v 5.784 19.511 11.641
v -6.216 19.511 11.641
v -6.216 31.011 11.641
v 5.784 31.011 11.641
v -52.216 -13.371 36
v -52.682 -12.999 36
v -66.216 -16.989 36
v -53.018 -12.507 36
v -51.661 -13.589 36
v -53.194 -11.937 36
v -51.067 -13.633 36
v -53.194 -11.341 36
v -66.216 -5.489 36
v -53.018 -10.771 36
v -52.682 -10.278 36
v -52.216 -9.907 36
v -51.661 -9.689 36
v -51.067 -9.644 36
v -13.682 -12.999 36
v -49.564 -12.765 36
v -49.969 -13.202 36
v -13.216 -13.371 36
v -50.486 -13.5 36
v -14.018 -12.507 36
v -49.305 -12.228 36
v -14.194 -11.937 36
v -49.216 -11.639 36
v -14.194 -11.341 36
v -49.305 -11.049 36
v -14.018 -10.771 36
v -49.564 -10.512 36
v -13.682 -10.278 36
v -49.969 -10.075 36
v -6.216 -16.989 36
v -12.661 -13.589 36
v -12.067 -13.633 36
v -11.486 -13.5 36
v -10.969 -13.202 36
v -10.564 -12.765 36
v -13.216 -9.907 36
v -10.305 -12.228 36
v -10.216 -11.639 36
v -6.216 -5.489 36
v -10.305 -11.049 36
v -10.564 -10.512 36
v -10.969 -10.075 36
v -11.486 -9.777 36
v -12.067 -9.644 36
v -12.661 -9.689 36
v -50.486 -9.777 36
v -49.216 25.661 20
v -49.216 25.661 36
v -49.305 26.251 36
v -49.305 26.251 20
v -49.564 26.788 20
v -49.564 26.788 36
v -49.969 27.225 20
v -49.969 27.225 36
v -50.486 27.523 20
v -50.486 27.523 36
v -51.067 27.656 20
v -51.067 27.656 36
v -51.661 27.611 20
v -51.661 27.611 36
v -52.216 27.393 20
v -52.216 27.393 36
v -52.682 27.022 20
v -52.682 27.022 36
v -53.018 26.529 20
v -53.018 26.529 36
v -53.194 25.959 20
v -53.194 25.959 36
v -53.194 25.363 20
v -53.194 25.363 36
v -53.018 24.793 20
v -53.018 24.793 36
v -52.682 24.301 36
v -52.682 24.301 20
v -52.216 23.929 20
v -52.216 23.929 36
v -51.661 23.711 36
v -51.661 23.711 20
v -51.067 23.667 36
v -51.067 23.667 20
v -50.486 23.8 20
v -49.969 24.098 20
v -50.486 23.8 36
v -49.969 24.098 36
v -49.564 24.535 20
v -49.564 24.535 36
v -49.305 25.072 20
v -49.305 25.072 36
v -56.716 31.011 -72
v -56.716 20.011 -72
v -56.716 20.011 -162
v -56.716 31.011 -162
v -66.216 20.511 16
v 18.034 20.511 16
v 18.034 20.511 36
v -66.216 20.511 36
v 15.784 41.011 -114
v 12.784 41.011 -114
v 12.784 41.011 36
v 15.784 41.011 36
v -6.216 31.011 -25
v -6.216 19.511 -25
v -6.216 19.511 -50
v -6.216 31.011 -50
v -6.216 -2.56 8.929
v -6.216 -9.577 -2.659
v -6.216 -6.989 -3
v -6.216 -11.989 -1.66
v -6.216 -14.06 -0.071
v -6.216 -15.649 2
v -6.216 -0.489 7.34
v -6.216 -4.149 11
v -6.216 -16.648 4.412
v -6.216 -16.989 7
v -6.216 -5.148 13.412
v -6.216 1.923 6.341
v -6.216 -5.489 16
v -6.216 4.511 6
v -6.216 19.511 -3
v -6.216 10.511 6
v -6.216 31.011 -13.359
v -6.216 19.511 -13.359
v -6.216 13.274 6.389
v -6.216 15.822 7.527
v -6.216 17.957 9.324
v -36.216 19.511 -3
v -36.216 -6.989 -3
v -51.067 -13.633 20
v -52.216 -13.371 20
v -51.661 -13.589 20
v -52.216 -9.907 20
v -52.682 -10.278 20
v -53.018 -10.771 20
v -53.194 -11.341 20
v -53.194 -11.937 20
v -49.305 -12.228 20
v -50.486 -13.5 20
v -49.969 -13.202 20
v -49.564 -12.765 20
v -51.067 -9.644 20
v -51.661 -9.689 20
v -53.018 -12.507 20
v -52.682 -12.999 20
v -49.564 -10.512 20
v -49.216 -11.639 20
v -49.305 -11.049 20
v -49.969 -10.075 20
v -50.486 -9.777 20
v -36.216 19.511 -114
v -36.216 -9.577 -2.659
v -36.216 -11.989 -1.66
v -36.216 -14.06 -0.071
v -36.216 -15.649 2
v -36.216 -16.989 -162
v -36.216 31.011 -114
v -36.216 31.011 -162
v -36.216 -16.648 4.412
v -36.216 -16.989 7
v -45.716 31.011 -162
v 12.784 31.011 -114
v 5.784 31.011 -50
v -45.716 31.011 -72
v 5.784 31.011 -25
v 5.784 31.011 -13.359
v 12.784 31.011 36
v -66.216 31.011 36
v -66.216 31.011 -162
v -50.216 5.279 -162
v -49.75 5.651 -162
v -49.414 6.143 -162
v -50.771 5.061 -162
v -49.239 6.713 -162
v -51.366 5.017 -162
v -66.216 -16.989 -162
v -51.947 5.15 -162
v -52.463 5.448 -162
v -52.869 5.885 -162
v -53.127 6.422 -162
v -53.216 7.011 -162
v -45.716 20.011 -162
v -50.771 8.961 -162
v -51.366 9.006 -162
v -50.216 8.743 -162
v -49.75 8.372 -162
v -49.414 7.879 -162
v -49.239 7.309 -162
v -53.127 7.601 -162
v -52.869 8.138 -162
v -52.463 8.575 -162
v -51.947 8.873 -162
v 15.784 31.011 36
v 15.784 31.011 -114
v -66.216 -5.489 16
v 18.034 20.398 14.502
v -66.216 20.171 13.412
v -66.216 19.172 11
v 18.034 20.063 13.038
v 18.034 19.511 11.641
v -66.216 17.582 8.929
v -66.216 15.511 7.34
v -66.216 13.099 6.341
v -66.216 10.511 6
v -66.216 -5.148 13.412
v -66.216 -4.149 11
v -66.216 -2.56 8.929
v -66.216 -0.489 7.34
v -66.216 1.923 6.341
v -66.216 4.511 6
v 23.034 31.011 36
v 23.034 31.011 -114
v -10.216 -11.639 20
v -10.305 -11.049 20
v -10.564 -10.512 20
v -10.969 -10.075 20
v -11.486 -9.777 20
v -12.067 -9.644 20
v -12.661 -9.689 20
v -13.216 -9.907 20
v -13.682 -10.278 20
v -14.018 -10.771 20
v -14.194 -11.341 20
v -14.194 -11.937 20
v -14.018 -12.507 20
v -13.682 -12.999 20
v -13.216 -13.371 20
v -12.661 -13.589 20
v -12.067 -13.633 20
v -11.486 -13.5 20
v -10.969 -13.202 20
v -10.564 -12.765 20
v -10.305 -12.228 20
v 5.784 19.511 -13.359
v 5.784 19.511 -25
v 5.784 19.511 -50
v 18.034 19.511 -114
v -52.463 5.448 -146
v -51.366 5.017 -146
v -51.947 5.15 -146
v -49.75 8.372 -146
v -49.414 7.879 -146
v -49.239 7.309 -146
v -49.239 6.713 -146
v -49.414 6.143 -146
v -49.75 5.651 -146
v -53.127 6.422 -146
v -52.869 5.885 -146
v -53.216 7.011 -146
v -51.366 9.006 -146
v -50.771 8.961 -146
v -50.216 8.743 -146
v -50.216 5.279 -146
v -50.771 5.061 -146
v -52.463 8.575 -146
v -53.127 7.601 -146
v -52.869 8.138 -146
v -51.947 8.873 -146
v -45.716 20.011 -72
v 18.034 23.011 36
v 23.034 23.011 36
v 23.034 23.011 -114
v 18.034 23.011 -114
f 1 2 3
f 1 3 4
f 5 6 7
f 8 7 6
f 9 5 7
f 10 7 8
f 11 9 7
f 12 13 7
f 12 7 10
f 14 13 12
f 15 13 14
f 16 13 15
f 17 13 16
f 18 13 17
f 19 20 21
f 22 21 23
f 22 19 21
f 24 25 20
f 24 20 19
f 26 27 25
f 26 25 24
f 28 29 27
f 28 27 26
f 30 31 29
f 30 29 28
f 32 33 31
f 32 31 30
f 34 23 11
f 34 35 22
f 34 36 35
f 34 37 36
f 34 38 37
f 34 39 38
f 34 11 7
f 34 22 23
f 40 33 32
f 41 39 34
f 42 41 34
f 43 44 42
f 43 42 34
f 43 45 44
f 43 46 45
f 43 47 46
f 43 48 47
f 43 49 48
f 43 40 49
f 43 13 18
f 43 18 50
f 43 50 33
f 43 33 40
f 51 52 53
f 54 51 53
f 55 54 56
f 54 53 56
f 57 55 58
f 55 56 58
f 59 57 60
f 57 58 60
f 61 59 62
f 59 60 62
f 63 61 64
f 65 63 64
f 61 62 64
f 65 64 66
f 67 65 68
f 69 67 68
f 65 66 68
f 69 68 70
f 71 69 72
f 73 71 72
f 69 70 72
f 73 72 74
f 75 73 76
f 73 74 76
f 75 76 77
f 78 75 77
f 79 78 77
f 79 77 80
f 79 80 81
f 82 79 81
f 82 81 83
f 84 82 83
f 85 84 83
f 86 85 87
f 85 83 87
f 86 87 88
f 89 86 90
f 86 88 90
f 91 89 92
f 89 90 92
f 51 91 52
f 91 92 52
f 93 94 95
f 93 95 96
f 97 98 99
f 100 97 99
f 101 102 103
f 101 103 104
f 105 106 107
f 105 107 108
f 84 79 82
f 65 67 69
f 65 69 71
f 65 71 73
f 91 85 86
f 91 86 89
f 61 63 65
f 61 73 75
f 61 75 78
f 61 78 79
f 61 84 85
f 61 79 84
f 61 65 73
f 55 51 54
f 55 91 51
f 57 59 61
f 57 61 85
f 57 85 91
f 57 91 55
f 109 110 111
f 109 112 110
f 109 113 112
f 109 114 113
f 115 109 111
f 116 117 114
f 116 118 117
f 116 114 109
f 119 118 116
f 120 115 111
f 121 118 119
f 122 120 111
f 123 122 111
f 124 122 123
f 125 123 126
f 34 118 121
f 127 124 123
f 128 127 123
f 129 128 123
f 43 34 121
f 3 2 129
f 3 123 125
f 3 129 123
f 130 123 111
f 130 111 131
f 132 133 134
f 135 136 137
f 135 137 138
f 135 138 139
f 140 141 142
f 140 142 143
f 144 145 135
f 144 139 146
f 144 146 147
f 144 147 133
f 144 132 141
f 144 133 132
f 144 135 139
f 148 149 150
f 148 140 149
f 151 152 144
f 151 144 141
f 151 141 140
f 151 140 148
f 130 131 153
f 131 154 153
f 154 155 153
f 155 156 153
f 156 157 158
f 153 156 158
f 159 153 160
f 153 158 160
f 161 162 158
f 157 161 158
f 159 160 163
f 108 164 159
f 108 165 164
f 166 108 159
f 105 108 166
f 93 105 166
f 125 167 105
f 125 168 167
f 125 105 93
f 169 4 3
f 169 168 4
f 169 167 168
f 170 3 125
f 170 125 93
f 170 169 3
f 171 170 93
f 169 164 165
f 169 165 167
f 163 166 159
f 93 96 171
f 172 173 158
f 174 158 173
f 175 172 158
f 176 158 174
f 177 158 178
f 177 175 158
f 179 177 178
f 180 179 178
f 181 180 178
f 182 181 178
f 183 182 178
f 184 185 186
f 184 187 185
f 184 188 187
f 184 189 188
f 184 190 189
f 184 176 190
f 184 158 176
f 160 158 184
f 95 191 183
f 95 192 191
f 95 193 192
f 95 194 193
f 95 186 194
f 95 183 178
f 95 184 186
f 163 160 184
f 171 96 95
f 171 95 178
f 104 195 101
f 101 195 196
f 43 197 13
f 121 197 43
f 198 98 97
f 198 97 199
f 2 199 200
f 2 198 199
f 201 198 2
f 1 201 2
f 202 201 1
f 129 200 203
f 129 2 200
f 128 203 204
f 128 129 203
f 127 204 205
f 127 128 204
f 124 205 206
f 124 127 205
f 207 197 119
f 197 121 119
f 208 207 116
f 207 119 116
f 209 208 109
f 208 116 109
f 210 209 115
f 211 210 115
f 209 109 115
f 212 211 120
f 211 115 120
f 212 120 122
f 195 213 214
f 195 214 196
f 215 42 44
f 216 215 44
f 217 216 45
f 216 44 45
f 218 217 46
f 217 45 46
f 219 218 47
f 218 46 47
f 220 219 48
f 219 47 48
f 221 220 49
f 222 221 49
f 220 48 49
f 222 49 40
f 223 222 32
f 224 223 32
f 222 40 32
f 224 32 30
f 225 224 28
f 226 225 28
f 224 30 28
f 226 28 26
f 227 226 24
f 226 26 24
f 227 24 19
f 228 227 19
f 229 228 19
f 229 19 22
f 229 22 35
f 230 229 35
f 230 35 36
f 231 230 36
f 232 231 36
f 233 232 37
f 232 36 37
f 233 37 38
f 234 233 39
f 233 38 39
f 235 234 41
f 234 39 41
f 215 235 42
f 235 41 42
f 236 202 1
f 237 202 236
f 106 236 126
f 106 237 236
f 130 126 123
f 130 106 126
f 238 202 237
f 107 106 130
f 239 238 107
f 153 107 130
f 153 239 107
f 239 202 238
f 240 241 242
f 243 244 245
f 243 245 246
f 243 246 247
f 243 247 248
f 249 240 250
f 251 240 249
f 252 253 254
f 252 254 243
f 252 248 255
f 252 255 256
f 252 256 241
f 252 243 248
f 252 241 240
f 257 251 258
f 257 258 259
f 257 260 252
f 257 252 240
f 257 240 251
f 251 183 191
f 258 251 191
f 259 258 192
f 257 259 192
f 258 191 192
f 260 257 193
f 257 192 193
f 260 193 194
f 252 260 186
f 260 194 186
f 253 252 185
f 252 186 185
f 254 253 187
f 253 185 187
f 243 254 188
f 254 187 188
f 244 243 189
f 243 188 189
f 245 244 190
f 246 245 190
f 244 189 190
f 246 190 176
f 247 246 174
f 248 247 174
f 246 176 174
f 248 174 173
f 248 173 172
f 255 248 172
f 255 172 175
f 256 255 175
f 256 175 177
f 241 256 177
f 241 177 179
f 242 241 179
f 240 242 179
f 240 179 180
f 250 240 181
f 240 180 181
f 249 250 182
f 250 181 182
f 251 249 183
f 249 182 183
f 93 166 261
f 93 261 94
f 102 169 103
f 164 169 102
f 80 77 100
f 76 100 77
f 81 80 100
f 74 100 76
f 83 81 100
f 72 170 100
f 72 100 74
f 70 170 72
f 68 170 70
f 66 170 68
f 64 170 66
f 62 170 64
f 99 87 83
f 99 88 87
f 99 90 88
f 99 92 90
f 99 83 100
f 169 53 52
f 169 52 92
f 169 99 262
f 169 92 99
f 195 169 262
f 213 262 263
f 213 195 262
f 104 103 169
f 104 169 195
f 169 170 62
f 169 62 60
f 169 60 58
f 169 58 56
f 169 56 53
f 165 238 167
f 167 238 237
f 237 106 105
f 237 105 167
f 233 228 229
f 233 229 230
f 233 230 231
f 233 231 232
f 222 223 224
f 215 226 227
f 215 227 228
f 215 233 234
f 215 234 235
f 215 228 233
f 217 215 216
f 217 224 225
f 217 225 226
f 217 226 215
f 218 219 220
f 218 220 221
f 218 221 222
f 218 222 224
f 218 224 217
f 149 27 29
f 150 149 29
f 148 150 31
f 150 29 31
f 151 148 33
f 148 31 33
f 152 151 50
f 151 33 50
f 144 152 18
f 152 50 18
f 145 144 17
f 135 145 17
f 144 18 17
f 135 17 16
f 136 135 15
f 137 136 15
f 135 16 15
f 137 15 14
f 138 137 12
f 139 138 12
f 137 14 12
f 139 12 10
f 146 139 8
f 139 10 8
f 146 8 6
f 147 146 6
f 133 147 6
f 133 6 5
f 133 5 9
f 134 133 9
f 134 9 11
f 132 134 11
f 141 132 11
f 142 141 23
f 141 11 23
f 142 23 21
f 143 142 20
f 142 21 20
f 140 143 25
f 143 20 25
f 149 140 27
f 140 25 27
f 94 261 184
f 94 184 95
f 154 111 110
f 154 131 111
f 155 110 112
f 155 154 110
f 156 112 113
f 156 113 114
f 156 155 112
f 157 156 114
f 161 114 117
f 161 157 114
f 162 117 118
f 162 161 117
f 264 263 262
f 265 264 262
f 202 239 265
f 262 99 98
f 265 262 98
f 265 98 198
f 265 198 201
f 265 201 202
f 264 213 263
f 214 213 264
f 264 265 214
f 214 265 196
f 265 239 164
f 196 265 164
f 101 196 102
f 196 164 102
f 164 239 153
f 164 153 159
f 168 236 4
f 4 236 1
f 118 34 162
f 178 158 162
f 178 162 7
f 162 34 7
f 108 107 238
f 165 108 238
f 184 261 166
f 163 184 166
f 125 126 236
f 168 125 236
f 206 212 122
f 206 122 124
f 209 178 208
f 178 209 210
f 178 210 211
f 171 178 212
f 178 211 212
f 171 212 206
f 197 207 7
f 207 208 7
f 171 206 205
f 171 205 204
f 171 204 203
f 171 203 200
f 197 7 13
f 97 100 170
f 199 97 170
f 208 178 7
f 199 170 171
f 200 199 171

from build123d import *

# Parameters (mm, degrees)
CROQUIS1_W                 = 60
CROQUIS1_H                 = 48
SALIENTE_EXTRUIR1_DEPTH    = 6
CROQUIS4_W                 = 60
CROQUIS4_H                 = 11.5
SALIENTE_EXTRUIR3_DEPTH    = 30
CROQUIS5_R                 = 2
CORTAR_EXTRUIR3_DEPTH      = 16
CROQUIS6_W                 = 30
CROQUIS6_H                 = 48
SALIENTE_EXTRUIR4_DEPTH    = 162
CROQUIS7_R                 = 2
CORTAR_EXTRUIR4_DEPTH      = 16
CROQUIS11_W                = 150
CROQUIS11_H                = 11.5
SALIENTE_EXTRUIR6_DEPTH    = 59.25
CROQUIS12_W                = 3
CROQUIS12_H                = 150
SALIENTE_EXTRUIR7_DEPTH    = 10
CORTAR_EXTRUIR6_DEPTH      = 170.016303475
CORTAR_EXTRUIR6_DEPTH_BACK = 170.016303475
CROQUIS14_W                = 5
CROQUIS14_H                = 3.5
CORTAR_EXTRUIR7_DEPTH      = 213.768679181
CORTAR_EXTRUIR7_DEPTH_BACK = 90
CROQUIS15_W                = 11
CROQUIS15_H                = 11
CROQUIS16_W                = 30
CROQUIS16_H                = 1
CORTAR_EXTRUIR10_DEPTH     = 190.450484429
REDONDEO1_R                = 10
CROQUIS20_W                = 30
CROQUIS20_H                = 36.5
SALIENTE_EXTRUIR8_DEPTH    = 50
CROQUIS21_W                = 12
CROQUIS21_H                = 25
CORTAR_EXTRUIR11_DEPTH     = 40
CROQUIS22_W                = 30
CROQUIS22_H                = 36.5
CORTAR_EXTRUIR13_DEPTH     = 47
REDONDEO3_R                = 10


with BuildPart() as part:
    # Croquis1 → Saliente-Extruir1 (new body)
    with BuildSketch(Plane.XY):
        with Locations((-36.216216216, 7.011261261)):
            Rectangle(CROQUIS1_W, CROQUIS1_H)
    extrude(amount=SALIENTE_EXTRUIR1_DEPTH)

    # Croquis4 → Saliente-Extruir3 (add)
    with BuildSketch(Plane.XY.offset(6)):
        with Locations((-36.216216216, 25.261261261)):
            Rectangle(CROQUIS4_W, CROQUIS4_H)
        with Locations((-36.216216216, -11.238738739)):
            Rectangle(CROQUIS4_W, CROQUIS4_H)
    extrude(amount=SALIENTE_EXTRUIR3_DEPTH)

    # Croquis5 → Cortar-Extruir3 (cut)
    with BuildSketch(Plane.XY.offset(36)):
        with Locations((-51.216216216, 25.661261261)):
            Circle(CROQUIS5_R)
        with Locations((-12.216216216, 25.661261261)):
            Circle(CROQUIS5_R)
        with Locations((-12.216216216, -11.638738739)):
            Circle(CROQUIS5_R)
        with Locations((-51.216216216, -11.638738739)):
            Circle(CROQUIS5_R)
    extrude(amount=-CORTAR_EXTRUIR3_DEPTH, mode=Mode.SUBTRACT)

    # Croquis6 → Saliente-Extruir4 (add)
    with BuildSketch(Plane(origin=(0, 0, 0), x_dir=(-1, 0, 0), z_dir=(0, 0, -1))):
        with Locations((51.216216216, 7.011261261)):
            Rectangle(CROQUIS6_W, CROQUIS6_H)
    extrude(amount=SALIENTE_EXTRUIR4_DEPTH)

    # Croquis7 → Cortar-Extruir4 (cut)
    with BuildSketch(Plane(origin=(0, 0, -162), x_dir=(-1, 0, 0), z_dir=(0, 0, -1))):
        with Locations((51.216216216, 7.011261261)):
            Circle(CROQUIS7_R)
    extrude(amount=-CORTAR_EXTRUIR4_DEPTH, mode=Mode.SUBTRACT)

    # Croquis11 → Saliente-Extruir6 (add)
    with BuildSketch(Plane(origin=(-36.216216216, 0, 0), x_dir=(0, 0, -1), z_dir=(1, 0, 0))):
        with Locations((39, 25.261261261)):
            Rectangle(CROQUIS11_W, CROQUIS11_H)
    extrude(amount=SALIENTE_EXTRUIR6_DEPTH)

    # Croquis12 → Saliente-Extruir7 (add)
    with BuildSketch(Plane(origin=(0, 31.011261261, 0), x_dir=(1, 0, 0), z_dir=(0, 1, 0))):
        with Locations((14.283783784, 39)):
            Rectangle(CROQUIS12_W, CROQUIS12_H)
    extrude(amount=SALIENTE_EXTRUIR7_DEPTH)

    # Croquis14 → Cortar-Extruir6 (cut, two sides: drawn at the far end of the back side and taken through both)
    with BuildSketch(Plane(origin=(0, 0, -114), x_dir=(-1, 0, 0), z_dir=(0, 0, -1)).offset(-CORTAR_EXTRUIR6_DEPTH_BACK)):
        with Locations((-20.533783784, 21.261261261)):
            Rectangle(CROQUIS14_W, CROQUIS14_H)
    extrude(amount=CORTAR_EXTRUIR6_DEPTH + CORTAR_EXTRUIR6_DEPTH_BACK, mode=Mode.SUBTRACT)

    # Croquis15 → Cortar-Extruir7 (cut, two sides: drawn at the far end of the back side and taken through both)
    with BuildSketch(Plane(origin=(0, 0, -162), x_dir=(-1, 0, 0), z_dir=(0, 0, -1)).offset(-CORTAR_EXTRUIR7_DEPTH_BACK)):
        with Locations((51.216216216, 25.511261261)):
            Rectangle(CROQUIS15_W, CROQUIS15_H)
    extrude(amount=CORTAR_EXTRUIR7_DEPTH + CORTAR_EXTRUIR7_DEPTH_BACK, mode=Mode.SUBTRACT)

    # Croquis16 → Cortar-Extruir10 (cut, through all)
    with BuildSketch(Plane.ZY.offset(66.216216216)):
        with Locations((21, 20.011261261)):
            Rectangle(CROQUIS16_W, CROQUIS16_H)
    extrude(amount=-CORTAR_EXTRUIR10_DEPTH, mode=Mode.SUBTRACT)

    # Redondeo1
    redondeo1_edges = [part.edges().sort_by_distance(p)[0] for p in [
        (-36.216216216, -5.488738739, 6),
        (-24.091216216, 20.511261261, 6),
    ]]
    fillet(redondeo1_edges, radius=REDONDEO1_R)

    # Croquis20 → Saliente-Extruir8 (add)
    with BuildSketch(Plane(origin=(0, 0, 0), x_dir=(-1, 0, 0), z_dir=(0, 0, -1))):
        with Locations((21.216216216, 1.261261261)):
            Rectangle(CROQUIS20_W, CROQUIS20_H)
    extrude(amount=SALIENTE_EXTRUIR8_DEPTH)

    # Croquis21 → Cortar-Extruir11 (cut)
    with BuildSketch(Plane.XZ.offset(-19.511261261)):
        with Locations((-0.216216216, -0.858898944)):
            Rectangle(CROQUIS21_W, CROQUIS21_H)
        with Locations((-0.216216216, -37.5)):
            Rectangle(CROQUIS21_W, CROQUIS21_H)
    extrude(amount=-CORTAR_EXTRUIR11_DEPTH, mode=Mode.SUBTRACT)

    # Croquis22 → Cortar-Extruir13 (cut)
    with BuildSketch(Plane(origin=(0, 0, -50), x_dir=(-1, 0, 0), z_dir=(0, 0, -1))):
        with Locations((21.216216216, 1.261261261)):
            Rectangle(CROQUIS22_W, CROQUIS22_H)
    extrude(amount=-CORTAR_EXTRUIR13_DEPTH, mode=Mode.SUBTRACT)

    # Redondeo3
    redondeo3_edges = [part.edges().sort_by_distance(p)[0] for p in [
        (-21.216216216, -16.988738739, -3),
    ]]
    fillet(redondeo3_edges, radius=REDONDEO3_R)


solid = part.part
